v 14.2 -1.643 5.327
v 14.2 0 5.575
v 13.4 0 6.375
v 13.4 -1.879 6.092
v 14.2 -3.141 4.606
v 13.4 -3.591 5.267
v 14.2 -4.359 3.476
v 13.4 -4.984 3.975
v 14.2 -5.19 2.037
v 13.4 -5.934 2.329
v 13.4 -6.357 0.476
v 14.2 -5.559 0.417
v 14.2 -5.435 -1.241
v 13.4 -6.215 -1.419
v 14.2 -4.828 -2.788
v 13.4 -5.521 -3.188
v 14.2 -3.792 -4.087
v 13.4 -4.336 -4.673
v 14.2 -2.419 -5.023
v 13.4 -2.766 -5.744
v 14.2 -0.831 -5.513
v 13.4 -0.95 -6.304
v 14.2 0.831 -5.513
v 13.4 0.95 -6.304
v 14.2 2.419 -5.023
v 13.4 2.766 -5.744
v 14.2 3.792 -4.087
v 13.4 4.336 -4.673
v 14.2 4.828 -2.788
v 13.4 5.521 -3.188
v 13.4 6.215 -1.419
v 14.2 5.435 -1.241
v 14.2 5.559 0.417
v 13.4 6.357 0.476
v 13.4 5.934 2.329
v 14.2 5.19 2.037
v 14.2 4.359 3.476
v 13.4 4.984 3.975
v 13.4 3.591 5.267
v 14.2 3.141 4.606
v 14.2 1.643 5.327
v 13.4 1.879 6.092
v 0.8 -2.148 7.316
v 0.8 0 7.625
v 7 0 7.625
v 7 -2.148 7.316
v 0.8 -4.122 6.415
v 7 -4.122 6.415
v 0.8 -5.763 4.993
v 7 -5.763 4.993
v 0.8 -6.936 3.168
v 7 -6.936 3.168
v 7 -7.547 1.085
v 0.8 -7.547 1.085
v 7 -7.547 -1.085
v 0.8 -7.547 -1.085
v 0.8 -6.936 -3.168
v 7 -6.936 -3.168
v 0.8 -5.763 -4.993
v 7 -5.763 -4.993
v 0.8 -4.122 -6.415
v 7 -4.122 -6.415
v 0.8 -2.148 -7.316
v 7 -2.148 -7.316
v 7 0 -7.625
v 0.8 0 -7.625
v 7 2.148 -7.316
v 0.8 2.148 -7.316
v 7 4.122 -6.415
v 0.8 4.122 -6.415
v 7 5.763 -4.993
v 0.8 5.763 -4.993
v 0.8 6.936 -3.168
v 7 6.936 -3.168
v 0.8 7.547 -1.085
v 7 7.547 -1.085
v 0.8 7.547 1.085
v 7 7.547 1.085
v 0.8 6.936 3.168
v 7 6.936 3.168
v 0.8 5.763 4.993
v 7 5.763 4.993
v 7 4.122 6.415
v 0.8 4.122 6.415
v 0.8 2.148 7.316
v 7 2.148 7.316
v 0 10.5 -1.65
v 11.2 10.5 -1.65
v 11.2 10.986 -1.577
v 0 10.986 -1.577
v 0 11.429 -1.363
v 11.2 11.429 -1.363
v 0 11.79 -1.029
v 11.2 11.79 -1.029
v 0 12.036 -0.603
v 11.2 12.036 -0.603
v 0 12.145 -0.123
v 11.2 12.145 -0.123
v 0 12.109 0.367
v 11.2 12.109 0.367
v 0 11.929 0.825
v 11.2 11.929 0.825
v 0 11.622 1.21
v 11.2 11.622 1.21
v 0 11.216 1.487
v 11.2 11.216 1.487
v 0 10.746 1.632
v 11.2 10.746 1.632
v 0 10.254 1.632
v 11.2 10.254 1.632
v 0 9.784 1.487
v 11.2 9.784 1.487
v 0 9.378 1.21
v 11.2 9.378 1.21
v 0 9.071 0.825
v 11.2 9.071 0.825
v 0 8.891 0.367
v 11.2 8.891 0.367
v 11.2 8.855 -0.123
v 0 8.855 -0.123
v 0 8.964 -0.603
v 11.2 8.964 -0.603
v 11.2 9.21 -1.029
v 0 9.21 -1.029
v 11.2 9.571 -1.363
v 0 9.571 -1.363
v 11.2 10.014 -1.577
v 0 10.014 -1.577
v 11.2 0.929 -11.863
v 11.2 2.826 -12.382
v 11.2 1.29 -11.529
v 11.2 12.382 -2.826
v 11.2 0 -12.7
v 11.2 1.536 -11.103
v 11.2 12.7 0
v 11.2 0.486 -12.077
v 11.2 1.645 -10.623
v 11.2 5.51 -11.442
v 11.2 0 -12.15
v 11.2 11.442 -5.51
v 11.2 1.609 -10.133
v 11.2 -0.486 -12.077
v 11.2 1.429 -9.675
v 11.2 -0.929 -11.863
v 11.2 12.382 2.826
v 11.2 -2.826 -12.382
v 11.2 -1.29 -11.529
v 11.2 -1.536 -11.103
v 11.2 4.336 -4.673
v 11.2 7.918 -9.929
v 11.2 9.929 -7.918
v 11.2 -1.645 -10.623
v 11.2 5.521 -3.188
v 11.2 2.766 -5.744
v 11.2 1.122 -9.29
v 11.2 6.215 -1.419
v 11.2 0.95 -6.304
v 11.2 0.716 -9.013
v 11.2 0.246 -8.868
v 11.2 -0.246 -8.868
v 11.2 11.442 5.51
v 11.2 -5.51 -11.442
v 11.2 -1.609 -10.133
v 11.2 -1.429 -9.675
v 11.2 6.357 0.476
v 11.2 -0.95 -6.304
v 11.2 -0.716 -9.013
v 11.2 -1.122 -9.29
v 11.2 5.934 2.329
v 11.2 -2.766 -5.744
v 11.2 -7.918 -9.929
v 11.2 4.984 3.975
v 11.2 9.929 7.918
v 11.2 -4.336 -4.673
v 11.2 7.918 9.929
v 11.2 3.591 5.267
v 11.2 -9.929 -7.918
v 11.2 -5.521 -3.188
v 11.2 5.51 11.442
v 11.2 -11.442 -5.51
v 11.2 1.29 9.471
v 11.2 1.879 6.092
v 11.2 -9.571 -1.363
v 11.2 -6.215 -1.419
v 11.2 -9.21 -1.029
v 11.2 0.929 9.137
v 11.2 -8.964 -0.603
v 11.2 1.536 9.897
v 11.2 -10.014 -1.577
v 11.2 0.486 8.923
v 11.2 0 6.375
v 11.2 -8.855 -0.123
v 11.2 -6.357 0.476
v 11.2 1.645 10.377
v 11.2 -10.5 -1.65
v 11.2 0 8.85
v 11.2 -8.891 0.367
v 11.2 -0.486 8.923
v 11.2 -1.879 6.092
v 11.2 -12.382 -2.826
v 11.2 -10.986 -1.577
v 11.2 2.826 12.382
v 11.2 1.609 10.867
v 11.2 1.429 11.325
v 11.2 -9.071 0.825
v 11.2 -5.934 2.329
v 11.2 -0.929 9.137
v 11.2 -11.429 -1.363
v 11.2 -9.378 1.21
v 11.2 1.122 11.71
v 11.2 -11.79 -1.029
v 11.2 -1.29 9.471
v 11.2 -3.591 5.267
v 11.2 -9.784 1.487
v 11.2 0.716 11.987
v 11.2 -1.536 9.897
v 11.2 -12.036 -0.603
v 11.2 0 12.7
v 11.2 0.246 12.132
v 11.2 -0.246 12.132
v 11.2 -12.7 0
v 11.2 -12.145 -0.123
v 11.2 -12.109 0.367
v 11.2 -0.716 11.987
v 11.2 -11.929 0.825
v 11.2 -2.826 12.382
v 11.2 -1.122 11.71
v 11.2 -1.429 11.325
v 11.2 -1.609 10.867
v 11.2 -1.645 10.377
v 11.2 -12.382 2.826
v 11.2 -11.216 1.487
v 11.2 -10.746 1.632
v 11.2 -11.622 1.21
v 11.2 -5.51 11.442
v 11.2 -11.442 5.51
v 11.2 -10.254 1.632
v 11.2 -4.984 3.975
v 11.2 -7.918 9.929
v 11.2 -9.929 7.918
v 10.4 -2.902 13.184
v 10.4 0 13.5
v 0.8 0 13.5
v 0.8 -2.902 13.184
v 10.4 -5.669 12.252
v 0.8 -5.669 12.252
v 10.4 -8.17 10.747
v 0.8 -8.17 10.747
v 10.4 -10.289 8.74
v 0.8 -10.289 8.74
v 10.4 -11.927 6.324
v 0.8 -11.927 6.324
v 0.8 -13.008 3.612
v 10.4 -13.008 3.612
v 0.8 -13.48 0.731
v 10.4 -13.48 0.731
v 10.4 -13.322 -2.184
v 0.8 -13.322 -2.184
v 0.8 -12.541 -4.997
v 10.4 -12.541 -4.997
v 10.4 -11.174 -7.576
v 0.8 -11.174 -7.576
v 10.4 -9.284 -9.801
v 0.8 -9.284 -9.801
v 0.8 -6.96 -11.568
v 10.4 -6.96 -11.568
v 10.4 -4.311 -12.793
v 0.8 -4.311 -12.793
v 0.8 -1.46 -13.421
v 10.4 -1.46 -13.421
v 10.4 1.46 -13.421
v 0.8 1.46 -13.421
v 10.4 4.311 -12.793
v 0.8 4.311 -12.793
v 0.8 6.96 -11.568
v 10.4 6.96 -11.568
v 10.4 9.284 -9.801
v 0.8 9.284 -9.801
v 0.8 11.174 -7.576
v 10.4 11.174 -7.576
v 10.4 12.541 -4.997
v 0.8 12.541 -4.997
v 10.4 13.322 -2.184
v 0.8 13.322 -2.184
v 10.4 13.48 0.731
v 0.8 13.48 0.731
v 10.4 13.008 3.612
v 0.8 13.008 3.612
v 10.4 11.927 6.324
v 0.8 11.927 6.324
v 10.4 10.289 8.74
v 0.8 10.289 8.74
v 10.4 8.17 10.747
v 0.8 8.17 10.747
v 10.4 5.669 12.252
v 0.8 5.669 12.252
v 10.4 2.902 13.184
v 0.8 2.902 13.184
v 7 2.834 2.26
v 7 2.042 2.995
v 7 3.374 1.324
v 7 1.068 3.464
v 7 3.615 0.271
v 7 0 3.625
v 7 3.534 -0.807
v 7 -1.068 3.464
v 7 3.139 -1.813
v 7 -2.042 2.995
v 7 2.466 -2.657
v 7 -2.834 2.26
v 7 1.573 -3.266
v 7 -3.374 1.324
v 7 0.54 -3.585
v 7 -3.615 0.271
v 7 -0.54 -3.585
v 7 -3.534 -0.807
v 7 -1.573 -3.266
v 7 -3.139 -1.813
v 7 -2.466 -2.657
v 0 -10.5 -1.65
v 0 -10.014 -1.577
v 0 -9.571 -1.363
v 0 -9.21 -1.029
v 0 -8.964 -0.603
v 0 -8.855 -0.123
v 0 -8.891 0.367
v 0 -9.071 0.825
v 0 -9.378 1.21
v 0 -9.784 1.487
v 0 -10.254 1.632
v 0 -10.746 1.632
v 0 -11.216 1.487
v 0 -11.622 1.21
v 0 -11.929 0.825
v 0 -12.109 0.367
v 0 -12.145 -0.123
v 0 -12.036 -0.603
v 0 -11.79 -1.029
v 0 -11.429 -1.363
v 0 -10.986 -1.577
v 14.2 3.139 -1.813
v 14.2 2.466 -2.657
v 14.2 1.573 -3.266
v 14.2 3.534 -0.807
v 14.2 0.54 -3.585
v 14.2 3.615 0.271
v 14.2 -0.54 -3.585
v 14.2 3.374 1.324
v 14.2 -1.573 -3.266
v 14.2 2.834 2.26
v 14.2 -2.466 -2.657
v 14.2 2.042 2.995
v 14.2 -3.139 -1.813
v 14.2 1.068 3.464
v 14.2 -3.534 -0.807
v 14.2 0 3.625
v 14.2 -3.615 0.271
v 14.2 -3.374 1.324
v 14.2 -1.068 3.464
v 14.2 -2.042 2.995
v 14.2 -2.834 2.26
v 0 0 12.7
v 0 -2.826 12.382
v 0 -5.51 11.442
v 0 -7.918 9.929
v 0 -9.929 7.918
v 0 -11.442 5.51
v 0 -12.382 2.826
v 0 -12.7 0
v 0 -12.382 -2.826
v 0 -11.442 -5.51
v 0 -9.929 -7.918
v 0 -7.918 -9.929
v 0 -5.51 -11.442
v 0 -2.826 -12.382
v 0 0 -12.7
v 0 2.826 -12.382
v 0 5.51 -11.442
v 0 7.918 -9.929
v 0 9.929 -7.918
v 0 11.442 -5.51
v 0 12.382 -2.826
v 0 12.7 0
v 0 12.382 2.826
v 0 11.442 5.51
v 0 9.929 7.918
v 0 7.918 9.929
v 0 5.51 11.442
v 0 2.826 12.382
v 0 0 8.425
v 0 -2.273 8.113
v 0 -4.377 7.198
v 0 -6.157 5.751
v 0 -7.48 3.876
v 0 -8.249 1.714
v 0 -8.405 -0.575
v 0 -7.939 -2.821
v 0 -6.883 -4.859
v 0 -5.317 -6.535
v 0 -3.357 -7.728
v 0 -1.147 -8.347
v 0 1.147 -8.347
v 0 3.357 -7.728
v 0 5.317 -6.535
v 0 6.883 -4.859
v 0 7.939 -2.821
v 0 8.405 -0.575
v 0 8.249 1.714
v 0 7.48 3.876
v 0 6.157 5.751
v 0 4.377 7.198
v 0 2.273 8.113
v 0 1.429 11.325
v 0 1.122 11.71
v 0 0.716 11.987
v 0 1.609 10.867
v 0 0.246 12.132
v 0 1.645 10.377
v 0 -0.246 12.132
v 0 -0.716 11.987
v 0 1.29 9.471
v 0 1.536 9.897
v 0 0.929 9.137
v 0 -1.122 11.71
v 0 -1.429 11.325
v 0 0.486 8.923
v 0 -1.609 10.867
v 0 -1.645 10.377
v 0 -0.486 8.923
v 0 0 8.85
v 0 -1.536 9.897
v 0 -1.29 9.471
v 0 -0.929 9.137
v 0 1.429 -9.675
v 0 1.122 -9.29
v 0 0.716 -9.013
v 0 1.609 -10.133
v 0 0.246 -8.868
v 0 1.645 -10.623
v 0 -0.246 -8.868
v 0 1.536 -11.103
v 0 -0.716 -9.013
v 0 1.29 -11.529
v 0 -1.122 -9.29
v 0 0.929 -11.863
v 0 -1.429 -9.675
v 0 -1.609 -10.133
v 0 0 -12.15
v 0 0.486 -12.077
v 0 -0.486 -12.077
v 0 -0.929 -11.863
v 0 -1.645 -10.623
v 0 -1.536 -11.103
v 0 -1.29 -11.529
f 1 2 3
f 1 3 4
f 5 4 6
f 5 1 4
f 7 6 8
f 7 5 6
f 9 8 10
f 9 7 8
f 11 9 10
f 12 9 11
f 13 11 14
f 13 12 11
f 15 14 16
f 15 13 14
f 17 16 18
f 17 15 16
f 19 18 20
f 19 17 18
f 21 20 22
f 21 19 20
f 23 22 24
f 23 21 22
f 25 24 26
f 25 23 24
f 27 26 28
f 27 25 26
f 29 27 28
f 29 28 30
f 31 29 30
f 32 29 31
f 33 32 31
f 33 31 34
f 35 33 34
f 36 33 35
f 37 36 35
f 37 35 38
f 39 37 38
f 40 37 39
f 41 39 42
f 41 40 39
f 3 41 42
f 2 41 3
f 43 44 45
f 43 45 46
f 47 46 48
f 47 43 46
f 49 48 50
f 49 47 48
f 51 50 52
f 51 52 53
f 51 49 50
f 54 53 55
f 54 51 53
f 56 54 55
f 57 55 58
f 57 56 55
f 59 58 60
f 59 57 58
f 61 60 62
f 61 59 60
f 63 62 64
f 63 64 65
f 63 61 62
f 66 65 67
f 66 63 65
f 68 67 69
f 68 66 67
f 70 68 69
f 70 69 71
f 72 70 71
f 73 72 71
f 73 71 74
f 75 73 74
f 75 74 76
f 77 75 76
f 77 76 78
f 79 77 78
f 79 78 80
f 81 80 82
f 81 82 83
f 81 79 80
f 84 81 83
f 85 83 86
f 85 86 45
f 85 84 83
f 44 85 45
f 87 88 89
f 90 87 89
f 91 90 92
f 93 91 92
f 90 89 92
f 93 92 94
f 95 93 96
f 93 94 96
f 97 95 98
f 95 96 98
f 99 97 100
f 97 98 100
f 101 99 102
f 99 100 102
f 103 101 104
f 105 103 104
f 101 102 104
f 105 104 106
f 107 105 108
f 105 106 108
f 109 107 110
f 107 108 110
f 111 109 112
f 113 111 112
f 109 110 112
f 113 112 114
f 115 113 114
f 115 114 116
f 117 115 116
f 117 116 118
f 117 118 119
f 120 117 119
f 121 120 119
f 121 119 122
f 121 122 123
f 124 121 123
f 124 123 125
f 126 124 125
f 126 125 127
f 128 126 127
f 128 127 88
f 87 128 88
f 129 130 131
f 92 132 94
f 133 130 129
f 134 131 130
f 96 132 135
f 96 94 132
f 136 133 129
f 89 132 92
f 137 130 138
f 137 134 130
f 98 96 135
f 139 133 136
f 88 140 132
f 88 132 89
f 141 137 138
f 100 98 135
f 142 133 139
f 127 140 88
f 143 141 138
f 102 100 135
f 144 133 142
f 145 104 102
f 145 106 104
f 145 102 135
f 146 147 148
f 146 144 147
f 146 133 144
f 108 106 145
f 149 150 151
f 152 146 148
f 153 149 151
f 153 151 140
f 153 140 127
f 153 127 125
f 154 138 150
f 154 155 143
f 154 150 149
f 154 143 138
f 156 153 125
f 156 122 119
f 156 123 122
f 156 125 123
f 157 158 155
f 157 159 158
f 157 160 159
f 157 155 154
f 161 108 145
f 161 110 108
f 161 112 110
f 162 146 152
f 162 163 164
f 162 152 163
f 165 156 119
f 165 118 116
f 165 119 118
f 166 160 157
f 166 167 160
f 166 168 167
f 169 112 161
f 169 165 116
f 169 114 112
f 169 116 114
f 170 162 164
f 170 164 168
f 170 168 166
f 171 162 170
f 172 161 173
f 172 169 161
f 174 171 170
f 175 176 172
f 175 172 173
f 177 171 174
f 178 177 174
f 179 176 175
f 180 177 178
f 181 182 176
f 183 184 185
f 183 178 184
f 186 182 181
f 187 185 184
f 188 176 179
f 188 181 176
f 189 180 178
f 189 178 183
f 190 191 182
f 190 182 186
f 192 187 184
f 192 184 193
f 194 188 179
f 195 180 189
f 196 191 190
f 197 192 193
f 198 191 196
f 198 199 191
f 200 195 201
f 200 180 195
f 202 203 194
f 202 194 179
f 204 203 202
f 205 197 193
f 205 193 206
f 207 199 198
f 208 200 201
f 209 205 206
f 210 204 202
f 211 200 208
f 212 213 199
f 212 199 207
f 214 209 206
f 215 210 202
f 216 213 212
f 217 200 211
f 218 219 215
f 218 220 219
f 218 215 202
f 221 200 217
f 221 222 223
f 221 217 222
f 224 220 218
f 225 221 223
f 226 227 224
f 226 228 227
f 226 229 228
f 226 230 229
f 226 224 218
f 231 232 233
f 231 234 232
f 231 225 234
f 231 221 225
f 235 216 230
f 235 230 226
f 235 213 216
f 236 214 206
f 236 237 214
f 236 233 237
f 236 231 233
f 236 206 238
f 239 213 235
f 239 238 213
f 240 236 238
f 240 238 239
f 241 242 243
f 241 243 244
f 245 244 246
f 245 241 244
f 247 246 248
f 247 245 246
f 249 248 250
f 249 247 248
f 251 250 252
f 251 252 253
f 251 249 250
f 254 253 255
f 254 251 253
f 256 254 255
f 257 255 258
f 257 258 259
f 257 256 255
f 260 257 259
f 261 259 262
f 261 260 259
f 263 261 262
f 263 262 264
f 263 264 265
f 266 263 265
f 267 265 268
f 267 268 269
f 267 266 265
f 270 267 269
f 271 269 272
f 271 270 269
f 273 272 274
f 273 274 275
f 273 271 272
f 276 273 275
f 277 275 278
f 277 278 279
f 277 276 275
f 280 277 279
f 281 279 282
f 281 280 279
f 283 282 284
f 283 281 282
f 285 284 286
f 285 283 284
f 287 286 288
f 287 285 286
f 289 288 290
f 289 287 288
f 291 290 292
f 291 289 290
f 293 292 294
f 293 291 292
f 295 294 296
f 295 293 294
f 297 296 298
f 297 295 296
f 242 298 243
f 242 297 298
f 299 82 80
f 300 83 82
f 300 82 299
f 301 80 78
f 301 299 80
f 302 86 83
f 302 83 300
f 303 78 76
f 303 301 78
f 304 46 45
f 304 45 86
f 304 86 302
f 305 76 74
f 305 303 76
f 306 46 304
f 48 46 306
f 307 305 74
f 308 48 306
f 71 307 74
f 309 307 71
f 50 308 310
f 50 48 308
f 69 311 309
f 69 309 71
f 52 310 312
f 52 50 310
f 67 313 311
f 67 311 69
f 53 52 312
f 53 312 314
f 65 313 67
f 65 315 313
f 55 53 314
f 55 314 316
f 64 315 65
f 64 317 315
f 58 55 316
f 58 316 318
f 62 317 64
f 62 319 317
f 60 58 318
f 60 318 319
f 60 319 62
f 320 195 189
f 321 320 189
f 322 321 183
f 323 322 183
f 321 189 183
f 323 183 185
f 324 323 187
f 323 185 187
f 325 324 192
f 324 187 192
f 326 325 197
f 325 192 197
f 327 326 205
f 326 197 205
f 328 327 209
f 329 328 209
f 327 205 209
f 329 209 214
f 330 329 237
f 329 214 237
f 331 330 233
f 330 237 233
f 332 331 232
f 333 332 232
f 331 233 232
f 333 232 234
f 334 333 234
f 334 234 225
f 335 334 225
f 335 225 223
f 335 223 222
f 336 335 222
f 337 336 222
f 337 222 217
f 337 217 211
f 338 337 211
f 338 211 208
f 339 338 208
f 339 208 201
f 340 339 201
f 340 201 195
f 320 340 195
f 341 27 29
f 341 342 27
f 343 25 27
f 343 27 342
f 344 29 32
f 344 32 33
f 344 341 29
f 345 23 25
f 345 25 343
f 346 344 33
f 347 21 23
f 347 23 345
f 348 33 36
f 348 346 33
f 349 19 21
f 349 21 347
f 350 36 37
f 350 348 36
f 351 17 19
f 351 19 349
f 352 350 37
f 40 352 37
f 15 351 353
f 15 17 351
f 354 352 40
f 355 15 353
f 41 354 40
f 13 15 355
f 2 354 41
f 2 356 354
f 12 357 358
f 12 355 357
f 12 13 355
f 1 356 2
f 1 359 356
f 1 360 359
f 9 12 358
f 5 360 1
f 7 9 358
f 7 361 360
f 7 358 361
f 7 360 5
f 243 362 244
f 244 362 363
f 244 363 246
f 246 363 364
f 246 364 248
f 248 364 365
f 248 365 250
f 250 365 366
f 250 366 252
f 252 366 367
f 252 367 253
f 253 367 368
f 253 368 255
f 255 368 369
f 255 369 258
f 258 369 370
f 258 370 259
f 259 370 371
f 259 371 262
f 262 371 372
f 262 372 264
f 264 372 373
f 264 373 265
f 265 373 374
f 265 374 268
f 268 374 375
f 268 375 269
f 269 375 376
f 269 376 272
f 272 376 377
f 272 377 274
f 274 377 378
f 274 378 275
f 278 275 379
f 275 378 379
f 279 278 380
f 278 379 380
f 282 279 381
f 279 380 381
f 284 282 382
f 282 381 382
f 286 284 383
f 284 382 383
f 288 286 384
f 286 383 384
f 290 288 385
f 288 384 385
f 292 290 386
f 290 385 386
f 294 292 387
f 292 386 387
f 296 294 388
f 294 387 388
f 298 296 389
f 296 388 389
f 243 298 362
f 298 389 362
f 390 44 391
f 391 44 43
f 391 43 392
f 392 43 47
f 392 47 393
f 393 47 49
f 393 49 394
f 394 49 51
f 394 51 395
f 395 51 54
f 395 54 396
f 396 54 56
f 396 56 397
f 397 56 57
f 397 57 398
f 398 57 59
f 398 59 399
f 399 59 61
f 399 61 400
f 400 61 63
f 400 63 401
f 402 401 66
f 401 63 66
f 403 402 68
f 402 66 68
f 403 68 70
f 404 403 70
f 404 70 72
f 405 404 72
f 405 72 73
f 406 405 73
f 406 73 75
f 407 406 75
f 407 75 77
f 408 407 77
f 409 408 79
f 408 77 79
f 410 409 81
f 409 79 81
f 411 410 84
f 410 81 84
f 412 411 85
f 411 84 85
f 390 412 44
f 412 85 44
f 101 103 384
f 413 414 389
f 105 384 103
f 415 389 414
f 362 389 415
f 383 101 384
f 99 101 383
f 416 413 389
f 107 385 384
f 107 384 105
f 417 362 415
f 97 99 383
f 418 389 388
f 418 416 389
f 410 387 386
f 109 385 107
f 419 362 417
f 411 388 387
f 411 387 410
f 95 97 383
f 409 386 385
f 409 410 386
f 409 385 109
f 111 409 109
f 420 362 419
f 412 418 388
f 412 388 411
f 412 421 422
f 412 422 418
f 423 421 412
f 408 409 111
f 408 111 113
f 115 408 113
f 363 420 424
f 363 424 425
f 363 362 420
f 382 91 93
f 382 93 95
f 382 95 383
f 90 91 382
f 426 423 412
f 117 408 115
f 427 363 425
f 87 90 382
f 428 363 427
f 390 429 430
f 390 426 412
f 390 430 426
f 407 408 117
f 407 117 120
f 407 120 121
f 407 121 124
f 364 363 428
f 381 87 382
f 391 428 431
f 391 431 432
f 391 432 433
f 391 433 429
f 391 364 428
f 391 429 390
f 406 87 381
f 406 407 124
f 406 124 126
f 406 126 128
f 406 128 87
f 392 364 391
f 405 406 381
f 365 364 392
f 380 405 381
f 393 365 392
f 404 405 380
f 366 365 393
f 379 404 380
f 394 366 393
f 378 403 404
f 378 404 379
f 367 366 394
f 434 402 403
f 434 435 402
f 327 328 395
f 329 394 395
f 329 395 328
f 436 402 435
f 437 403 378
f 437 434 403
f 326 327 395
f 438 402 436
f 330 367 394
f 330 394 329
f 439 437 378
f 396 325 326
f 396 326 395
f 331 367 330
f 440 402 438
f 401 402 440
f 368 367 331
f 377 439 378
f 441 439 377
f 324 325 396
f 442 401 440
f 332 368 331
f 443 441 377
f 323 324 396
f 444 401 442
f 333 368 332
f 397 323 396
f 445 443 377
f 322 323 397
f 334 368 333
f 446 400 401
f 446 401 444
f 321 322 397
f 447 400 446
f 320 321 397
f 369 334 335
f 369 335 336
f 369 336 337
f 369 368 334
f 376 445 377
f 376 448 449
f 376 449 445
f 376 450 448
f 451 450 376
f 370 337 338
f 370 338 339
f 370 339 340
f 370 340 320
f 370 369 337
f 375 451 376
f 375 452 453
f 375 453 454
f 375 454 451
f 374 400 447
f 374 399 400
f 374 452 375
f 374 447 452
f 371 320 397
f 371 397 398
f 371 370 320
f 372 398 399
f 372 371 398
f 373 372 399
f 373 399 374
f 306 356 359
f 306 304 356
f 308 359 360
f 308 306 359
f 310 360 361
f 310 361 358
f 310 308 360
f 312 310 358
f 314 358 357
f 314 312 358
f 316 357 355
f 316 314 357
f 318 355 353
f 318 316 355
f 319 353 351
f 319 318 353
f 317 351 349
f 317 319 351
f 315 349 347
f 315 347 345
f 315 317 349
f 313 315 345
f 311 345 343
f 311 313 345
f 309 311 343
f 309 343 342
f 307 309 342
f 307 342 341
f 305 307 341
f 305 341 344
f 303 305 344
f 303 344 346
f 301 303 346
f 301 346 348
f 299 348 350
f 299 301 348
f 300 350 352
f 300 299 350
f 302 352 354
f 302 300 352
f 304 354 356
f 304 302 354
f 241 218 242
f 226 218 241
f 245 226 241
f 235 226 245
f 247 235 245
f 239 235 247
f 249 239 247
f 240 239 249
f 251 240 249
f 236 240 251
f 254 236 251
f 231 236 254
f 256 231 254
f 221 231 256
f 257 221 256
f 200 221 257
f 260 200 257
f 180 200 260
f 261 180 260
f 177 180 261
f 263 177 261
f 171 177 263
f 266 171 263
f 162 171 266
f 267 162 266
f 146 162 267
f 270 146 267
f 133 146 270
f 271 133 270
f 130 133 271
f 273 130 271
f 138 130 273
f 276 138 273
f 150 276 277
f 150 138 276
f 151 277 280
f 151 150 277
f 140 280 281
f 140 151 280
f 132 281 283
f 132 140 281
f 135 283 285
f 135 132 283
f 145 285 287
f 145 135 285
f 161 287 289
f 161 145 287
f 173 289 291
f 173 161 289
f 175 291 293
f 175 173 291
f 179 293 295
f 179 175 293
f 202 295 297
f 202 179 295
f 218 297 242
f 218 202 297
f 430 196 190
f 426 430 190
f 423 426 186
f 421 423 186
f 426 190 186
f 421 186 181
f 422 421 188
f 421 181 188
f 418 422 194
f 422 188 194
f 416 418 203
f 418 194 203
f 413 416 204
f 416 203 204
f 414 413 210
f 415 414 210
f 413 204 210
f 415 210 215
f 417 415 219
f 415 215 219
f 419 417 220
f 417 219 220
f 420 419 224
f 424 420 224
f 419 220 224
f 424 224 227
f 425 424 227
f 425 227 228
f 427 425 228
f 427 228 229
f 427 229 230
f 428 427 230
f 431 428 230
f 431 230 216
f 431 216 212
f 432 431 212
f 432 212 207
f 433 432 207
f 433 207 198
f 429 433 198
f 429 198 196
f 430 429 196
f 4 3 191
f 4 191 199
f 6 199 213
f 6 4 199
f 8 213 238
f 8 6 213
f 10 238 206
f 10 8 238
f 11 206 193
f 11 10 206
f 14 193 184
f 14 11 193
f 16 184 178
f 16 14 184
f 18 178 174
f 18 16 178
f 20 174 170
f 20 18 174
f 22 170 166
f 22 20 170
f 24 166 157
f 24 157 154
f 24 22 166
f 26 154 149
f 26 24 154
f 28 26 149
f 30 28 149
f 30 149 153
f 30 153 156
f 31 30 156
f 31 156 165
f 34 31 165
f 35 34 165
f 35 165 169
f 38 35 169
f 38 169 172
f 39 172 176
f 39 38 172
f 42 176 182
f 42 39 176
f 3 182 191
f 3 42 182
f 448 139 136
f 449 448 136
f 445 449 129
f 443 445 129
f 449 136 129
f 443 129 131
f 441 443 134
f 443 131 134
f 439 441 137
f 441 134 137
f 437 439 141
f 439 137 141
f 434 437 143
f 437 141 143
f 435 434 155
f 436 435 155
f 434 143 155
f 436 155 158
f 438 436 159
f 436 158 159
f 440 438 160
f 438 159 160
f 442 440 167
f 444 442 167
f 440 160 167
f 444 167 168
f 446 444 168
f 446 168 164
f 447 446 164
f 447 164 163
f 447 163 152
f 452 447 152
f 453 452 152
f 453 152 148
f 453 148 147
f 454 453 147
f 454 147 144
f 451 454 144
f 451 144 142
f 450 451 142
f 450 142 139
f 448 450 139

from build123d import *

# Parameters (mm, degrees)
SKETCH_2_R          = 1.65
CUT_EXTRUDE_1_DEPTH = 23.134588318
CHAMFER_1_SIZE      = 0.8


with BuildPart() as part:
    # 草图1 → 旋转1 (revolve)
    with BuildSketch(Plane.XY, mode=Mode.PRIVATE) as revolve_1_sk:
        Polygon((0, 13.5), (11.2, 13.5), (11.2, 6.375), (14.2, 6.375), (14.2, 3.625), (7, 3.625), (7, 7.625), (0, 7.625), align=None)
    revolve(revolve_1_sk.sketch.rotate(Axis((0, 0, 0), (1, 0, 0)), 90), axis=Axis((0, 0, 0), (1, 0, 0)))

    # 草图2 → 切除-拉伸1 (cut, through all)
    with BuildSketch(Plane(origin=(11.2, 0, 0), x_dir=(0, 0, -1), z_dir=(1, 0, 0))):
        with Locations((0, 10.5)):
            Circle(SKETCH_2_R)
        with Locations((10.5, 0)):
            Circle(SKETCH_2_R)
        with Locations((0, -10.5)):
            Circle(SKETCH_2_R)
        with Locations((-10.5, 0)):
            Circle(SKETCH_2_R)
    extrude(amount=-CUT_EXTRUDE_1_DEPTH, mode=Mode.SUBTRACT)

    # 倒角1
    chamfer_1_edges = [part.edges().sort_by_distance(p)[0] for p in [
        (0, 0, -7.625),
        (0, 0, -13.5),
        (11.2, 0, -13.5),
        (14.2, 0, -6.375),
    ]]
    chamfer(chamfer_1_edges, length=CHAMFER_1_SIZE)


solid = part.part
